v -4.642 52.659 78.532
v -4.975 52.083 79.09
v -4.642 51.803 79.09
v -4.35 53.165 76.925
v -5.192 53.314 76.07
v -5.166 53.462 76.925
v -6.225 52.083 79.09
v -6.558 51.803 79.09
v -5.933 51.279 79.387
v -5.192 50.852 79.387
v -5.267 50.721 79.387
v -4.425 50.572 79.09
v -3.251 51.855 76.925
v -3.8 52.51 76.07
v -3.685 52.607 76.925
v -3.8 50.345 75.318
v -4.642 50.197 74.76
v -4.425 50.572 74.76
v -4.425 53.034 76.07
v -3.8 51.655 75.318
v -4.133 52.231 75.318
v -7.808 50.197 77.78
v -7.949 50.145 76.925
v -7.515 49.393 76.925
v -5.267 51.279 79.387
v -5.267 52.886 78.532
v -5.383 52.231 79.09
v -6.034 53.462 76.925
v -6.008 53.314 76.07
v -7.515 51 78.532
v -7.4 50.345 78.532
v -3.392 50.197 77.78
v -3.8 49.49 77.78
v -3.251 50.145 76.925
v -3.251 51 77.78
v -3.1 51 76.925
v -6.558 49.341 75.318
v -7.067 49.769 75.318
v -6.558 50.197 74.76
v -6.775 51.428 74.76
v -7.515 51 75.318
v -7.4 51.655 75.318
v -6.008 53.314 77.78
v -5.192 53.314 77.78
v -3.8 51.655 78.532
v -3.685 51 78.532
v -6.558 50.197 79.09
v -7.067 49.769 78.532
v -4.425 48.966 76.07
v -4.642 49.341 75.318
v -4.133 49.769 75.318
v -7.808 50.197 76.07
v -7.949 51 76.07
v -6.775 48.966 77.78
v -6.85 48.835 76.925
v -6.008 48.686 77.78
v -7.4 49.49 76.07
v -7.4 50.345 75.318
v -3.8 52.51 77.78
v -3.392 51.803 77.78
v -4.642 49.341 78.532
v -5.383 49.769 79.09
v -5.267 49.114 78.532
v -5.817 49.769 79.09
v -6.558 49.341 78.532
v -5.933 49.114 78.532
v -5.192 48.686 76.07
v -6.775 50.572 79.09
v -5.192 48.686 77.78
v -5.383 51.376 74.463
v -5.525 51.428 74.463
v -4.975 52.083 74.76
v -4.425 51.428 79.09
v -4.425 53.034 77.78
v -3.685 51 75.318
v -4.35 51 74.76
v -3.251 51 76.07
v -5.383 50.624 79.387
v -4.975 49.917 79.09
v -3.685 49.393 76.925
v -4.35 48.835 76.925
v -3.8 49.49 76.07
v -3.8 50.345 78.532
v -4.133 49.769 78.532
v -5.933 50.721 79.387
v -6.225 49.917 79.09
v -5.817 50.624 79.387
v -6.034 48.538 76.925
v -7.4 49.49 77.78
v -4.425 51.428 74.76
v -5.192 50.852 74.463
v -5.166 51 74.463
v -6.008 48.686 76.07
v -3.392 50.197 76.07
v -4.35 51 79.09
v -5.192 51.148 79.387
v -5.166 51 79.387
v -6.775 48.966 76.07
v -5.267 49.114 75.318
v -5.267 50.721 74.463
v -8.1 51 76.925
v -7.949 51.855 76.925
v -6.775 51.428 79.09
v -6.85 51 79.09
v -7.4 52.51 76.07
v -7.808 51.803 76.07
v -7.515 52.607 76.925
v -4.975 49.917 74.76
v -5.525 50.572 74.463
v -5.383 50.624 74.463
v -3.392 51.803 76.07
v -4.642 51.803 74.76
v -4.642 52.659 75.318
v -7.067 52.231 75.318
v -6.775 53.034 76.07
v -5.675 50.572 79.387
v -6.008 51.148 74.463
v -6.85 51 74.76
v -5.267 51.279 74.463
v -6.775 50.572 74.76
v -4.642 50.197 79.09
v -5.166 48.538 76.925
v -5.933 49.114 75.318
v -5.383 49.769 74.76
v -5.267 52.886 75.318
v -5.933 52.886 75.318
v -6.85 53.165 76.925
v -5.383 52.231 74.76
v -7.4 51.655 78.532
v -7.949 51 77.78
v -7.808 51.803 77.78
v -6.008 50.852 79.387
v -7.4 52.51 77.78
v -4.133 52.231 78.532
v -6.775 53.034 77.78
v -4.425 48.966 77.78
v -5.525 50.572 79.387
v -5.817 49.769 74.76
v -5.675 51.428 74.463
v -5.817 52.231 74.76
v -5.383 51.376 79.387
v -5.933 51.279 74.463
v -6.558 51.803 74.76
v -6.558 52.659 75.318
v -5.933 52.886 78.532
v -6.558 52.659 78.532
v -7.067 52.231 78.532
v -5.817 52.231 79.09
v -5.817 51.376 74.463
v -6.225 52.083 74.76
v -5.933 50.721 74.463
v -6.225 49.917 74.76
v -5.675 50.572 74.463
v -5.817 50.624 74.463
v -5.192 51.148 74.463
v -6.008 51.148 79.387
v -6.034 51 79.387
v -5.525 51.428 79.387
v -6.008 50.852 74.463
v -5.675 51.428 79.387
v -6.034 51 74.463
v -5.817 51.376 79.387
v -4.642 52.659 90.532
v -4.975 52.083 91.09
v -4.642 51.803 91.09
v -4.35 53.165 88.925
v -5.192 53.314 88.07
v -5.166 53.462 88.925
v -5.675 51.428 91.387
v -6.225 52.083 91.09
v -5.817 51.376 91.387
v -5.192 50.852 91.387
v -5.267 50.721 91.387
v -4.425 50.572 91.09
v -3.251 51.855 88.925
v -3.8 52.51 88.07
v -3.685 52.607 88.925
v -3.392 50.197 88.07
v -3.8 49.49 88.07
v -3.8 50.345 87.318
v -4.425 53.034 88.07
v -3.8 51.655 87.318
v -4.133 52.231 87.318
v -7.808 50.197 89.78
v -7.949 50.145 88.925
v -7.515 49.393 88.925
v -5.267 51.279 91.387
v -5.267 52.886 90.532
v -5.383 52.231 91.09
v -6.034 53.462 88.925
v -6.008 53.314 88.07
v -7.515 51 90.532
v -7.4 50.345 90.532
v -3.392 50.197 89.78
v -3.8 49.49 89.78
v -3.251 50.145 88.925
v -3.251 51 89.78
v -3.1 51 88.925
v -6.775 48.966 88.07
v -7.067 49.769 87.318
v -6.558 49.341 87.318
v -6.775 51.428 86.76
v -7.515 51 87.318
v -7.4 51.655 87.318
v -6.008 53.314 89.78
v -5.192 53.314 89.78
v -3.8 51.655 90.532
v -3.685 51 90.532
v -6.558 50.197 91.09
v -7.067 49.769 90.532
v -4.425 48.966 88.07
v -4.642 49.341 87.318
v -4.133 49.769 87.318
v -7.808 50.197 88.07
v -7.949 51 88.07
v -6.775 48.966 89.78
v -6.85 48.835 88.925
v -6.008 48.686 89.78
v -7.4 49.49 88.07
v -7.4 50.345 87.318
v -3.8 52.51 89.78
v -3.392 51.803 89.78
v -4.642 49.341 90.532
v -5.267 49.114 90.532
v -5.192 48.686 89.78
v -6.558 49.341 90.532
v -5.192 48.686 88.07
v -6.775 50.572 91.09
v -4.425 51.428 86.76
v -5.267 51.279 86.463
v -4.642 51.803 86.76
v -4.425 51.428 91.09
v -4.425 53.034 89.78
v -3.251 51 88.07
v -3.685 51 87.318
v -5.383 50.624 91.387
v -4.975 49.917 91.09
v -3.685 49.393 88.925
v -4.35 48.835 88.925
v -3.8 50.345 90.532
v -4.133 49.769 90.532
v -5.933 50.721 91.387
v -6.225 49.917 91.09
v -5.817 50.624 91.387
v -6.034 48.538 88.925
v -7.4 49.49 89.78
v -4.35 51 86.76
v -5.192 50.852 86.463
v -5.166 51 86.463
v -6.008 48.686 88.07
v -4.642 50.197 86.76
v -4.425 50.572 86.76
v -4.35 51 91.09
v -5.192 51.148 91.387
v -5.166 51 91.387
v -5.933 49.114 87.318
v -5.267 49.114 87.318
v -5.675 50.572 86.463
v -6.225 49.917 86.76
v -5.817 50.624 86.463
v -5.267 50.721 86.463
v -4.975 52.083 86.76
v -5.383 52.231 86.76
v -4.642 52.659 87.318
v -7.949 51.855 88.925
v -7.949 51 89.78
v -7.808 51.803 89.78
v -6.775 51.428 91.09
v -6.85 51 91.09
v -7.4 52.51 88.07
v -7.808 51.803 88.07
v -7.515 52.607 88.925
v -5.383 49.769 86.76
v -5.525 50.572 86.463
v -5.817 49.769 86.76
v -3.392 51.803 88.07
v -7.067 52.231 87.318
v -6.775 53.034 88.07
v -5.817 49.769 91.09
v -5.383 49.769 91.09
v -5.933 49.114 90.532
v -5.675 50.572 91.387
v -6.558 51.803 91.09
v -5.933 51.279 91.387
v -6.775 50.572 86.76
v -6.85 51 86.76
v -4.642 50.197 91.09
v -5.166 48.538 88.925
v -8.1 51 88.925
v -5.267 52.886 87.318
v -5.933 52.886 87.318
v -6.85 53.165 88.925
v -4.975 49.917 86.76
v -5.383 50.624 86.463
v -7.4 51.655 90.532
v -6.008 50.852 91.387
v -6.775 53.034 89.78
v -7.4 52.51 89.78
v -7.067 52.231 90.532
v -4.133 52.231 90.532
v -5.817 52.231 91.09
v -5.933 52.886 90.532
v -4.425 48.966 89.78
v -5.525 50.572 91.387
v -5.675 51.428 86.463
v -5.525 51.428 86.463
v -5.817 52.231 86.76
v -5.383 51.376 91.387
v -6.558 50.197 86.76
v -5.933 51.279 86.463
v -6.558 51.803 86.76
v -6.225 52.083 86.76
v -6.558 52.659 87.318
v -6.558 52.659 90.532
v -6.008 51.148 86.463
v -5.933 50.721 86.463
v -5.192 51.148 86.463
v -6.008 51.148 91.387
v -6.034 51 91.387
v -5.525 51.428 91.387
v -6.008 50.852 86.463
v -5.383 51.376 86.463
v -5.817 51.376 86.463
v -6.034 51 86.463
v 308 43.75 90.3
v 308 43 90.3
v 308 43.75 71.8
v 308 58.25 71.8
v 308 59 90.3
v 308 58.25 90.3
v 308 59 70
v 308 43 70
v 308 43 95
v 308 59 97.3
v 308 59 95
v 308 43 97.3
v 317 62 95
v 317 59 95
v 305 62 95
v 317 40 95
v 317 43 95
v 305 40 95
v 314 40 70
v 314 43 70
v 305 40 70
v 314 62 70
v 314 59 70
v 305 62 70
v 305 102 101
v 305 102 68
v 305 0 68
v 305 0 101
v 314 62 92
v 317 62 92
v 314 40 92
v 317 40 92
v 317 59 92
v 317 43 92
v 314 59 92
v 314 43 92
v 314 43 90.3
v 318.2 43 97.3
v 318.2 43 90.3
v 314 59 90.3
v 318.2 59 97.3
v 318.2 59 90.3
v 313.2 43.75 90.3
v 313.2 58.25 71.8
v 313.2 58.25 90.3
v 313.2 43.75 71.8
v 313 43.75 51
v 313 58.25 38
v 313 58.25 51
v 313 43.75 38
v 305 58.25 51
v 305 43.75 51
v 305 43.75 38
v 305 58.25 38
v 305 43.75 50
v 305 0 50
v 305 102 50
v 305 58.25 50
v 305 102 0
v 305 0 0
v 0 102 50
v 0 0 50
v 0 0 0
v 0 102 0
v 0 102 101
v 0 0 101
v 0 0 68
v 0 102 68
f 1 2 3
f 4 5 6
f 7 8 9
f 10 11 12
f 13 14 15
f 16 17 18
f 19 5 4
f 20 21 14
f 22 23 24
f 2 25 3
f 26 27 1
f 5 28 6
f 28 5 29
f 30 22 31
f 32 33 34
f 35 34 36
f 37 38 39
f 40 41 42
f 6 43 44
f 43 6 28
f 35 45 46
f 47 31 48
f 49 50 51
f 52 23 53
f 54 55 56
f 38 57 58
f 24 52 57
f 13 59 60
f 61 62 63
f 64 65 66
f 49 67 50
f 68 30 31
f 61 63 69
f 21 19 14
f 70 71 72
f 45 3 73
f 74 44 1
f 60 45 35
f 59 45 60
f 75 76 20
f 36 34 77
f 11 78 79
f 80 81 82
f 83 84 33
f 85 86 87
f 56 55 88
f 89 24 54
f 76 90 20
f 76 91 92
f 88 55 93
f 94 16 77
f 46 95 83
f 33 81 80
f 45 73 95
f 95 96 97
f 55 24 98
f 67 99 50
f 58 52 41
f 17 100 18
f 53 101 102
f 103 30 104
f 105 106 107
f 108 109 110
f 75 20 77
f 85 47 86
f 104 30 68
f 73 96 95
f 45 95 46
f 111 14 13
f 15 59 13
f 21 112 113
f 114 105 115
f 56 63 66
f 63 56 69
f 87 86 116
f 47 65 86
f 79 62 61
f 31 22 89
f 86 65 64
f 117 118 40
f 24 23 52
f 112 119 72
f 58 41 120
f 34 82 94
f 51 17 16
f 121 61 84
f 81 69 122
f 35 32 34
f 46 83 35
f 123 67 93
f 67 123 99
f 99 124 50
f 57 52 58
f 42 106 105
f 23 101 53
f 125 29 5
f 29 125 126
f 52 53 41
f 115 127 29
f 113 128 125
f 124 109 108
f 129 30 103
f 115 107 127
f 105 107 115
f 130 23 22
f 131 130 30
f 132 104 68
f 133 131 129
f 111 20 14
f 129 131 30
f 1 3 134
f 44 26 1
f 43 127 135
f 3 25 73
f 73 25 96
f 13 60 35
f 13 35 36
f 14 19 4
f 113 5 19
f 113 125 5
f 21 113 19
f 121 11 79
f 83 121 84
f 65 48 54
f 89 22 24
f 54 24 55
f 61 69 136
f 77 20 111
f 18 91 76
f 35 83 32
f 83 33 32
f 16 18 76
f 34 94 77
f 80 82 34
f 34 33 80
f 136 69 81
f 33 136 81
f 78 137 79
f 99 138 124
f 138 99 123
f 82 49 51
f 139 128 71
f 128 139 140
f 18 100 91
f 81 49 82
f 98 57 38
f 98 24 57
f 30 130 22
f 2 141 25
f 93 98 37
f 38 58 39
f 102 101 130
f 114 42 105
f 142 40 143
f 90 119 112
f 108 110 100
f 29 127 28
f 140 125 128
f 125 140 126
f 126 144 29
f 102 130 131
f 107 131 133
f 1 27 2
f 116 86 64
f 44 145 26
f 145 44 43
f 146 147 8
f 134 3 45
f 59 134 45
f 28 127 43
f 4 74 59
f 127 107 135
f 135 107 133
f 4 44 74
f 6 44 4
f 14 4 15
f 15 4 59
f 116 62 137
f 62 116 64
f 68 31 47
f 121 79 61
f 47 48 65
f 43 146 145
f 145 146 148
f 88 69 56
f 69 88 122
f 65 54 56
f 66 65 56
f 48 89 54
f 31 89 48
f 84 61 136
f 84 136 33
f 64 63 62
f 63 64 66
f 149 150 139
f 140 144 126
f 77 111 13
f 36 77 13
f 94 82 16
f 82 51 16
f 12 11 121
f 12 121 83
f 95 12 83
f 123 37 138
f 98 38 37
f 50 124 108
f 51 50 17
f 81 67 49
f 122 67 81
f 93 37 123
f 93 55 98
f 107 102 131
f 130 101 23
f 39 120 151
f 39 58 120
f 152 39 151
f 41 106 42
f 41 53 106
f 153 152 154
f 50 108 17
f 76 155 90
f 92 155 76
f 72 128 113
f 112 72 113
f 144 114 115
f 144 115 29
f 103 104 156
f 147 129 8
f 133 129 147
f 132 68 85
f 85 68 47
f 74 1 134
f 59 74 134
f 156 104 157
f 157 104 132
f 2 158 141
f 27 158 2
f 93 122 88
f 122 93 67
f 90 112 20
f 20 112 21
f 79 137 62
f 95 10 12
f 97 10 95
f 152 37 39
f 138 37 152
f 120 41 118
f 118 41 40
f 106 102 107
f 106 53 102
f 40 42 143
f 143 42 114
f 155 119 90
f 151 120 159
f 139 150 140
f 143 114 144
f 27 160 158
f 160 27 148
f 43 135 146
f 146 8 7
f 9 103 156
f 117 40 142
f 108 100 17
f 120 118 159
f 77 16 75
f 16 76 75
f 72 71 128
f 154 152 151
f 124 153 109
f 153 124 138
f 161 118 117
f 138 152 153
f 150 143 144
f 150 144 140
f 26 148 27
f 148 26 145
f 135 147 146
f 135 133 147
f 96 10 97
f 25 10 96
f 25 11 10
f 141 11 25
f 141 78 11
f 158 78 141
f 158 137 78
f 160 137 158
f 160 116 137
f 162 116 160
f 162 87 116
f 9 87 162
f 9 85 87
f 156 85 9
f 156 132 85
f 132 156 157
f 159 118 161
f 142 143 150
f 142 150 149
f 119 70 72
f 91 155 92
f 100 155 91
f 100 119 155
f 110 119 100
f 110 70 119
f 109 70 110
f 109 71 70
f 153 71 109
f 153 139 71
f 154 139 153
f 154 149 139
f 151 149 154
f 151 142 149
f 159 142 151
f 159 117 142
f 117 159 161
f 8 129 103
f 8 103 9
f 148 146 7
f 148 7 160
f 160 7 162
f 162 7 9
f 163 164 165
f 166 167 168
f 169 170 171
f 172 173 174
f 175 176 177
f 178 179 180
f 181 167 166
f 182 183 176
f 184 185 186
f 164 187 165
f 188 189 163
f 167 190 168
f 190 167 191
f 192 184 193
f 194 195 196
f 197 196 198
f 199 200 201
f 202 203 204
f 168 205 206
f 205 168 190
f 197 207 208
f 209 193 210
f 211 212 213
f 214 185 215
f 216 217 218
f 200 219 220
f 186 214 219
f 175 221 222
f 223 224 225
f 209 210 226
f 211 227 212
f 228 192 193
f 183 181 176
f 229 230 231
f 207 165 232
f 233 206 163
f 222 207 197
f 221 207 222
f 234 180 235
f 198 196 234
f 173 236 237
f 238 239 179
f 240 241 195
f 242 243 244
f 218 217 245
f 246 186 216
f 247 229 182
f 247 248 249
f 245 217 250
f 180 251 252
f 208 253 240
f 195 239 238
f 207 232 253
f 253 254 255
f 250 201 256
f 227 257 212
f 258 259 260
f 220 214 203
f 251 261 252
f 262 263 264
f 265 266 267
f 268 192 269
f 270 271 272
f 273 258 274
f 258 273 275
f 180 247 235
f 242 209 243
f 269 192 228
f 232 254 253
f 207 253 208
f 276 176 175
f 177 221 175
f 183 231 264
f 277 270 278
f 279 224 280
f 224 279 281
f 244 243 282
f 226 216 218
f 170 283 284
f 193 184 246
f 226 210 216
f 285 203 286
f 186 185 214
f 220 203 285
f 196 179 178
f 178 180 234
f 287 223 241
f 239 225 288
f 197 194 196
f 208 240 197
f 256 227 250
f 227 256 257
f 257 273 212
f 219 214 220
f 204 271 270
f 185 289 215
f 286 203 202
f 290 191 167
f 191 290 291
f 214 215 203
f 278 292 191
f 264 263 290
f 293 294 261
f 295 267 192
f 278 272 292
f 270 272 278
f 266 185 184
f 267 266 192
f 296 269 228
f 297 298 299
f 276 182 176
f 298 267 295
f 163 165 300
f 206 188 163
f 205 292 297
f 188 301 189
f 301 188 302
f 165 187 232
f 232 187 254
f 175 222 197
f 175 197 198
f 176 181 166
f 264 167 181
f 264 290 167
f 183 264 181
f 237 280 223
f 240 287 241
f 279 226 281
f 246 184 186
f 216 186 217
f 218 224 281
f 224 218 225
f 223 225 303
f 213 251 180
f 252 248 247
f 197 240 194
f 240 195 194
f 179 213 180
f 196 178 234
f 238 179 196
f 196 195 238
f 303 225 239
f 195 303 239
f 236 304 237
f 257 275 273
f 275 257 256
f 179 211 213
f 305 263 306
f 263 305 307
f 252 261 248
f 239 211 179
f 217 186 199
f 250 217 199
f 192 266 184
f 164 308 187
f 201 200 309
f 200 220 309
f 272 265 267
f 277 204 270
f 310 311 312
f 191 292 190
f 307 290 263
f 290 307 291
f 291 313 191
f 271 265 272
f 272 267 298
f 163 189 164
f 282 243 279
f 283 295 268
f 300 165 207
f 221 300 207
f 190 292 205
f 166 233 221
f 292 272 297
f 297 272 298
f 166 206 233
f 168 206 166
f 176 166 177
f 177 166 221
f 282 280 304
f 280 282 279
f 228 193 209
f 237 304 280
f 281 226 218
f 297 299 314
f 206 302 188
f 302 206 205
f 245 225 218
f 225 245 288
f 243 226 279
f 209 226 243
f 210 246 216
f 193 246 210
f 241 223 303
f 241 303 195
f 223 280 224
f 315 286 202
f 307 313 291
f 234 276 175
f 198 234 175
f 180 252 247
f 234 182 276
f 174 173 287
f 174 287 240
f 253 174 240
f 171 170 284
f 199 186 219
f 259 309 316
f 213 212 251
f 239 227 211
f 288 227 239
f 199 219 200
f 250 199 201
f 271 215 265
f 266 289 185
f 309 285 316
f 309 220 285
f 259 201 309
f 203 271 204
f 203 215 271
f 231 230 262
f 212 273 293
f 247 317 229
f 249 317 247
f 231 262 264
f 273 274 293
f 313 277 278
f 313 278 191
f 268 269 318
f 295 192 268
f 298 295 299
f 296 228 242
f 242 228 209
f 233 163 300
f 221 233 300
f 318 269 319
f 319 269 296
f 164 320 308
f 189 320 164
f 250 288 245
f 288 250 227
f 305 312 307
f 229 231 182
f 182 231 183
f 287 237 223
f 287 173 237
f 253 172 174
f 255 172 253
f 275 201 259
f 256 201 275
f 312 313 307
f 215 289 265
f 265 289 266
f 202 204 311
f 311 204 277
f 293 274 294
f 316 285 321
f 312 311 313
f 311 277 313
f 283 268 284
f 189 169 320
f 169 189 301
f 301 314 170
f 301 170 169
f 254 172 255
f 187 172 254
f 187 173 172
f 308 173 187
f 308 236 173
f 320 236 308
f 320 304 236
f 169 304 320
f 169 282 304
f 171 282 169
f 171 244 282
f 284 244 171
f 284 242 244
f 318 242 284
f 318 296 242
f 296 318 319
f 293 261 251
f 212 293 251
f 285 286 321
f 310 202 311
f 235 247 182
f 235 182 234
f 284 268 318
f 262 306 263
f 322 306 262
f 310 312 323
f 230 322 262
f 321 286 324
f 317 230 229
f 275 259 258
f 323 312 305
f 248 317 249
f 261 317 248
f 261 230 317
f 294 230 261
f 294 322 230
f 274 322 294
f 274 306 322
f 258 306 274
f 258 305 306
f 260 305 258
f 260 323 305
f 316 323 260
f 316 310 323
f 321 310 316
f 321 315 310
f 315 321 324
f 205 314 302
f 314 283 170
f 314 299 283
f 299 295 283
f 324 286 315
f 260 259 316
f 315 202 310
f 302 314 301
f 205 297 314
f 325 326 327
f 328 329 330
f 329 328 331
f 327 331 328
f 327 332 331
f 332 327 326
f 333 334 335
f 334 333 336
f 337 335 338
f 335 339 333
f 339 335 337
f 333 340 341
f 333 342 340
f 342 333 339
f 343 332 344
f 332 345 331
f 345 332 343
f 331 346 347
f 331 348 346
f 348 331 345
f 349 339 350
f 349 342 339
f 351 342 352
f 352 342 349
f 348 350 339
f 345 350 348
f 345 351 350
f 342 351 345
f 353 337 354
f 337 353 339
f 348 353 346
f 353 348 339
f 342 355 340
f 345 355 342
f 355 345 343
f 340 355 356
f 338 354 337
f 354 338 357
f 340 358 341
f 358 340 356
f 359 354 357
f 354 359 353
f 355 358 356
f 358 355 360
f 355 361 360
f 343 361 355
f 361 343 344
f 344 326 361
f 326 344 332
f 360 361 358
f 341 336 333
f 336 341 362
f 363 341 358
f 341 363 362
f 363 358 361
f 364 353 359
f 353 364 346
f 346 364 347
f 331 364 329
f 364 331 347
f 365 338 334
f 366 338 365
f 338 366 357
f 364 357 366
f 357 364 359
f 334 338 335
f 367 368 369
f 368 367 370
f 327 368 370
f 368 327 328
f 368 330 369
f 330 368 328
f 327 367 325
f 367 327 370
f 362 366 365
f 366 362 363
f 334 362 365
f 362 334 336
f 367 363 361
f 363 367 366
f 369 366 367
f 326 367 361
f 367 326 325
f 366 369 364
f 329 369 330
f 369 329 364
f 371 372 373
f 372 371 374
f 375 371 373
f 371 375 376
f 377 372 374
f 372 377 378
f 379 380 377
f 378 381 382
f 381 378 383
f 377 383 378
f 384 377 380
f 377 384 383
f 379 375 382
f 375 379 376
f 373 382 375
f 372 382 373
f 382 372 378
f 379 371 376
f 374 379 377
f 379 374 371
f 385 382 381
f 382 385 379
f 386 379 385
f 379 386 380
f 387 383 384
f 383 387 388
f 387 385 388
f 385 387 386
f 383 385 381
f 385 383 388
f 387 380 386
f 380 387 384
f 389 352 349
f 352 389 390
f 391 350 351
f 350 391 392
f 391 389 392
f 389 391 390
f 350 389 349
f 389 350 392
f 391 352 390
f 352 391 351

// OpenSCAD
// 03_sliding_bolt_detent.scad
// Sliding bolt with snap-ball detent on the SHORT end-wall of the upper tray.
// A rectangular bolt rides in a channel on the end face; sliding it down/in
// causes the tip to enter a pocket in the lower tray end-wall, locking both
// lift and pull-apart. A snap-ball detent clicks in OPEN and LOCKED positions.
// Engage: push bolt downward (−Z) until it clicks into the lower pocket.
// Release: pull bolt upward (+Z) until it clicks out, then lift upper tray.
//
// Two bolts (one per short end face) for positive grip at both ends.

explode = 18; // 0=engaged, 18=exploded

lx = 305; ly = 102; lz_lo = 50; lz_hi = 33;
wall = 3;

color_lo  = [0.35, 0.55, 0.80, 1];
color_hi  = [0.55, 0.78, 0.95, 1];
color_bolt= [0.85, 0.58, 0.10, 1];   // amber bolt
color_ch  = [0.22, 0.40, 0.65, 1];   // dark-blue channel housing
color_pkt = [0.50, 0.30, 0.70, 1];   // purple pocket indicator

module lower_tray() { color(color_lo) cube([lx, ly, lz_lo]); }
module upper_tray() {
    color(color_hi) translate([0, 0, lz_lo + explode]) cube([lx, ly, lz_hi]);
}

// ── Parameters ────────────────────────────────────────────────────────────────
ch_w   = 16;    // channel interior width (Y)
ch_h   = 22;    // channel interior height (Z span on end face)
ch_t   = 3;     // channel housing wall thickness
prot   = 6;     // channel protrudes this much out from end-face (X)

bolt_w = ch_w - 1.5;
bolt_h = ch_h - 1.5;
bolt_t = prot - 0.8;
tip_d  = 12;    // how far bolt plunges into lower pocket when locked

// Travel: bolt slides -Z to engage
locked = (explode == 0);
bolt_dz = locked ? -tip_d : 0;   // bolt position shift

by = ly / 2;  // centre of short face

// ── Channel housing on upper tray end face ───────────────────────────────────
module channel_box(ex) {
    x_dir = (ex == 0) ? -1 : 1;
    uz = lz_lo + explode;
    // Channel sits centred on Y, from just above mating face upward
    color(color_ch) {
        // back plate (against tray face)
        translate([ex, by - ch_w/2 - ch_t, uz + 2])
            cube([x_dir * ch_t, ch_w + ch_t * 2, ch_h + ch_t]);
        // top cap
        translate([ex, by - ch_w/2 - ch_t, uz + 2 + ch_h])
            cube([x_dir * (ch_t + prot + ch_t), ch_w + ch_t * 2, ch_t]);
        // left side wall
        translate([ex, by - ch_w/2 - ch_t, uz + 2])
            cube([x_dir * (prot + ch_t), ch_t, ch_h + ch_t]);
        // right side wall
        translate([ex, by + ch_w/2, uz + 2])
            cube([x_dir * (prot + ch_t), ch_t, ch_h + ch_t]);
    }
}

// ── Receiving pocket on lower tray end face ───────────────────────────────────
module lower_pocket(ex) {
    x_dir = (ex == 0) ? -1 : 1;
    // Pocket straddles mating face: dips below lz_lo
    color(color_pkt)
    translate([ex, by - bolt_w/2, lz_lo - tip_d])
        cube([x_dir * (prot + ch_t - 1), bolt_w, tip_d + 1]);
}

// ── Bolt body ─────────────────────────────────────────────────────────────────
module bolt(ex) {
    x_dir = (ex == 0) ? -1 : 1;
    uz = lz_lo + explode;
    bz = uz + 2 + ch_t * 0.6 + bolt_dz;

    color(color_bolt) {
        // Main bolt slab
        translate([ex + x_dir * ch_t, by - bolt_w/2, bz])
            cube([x_dir * bolt_t, bolt_w, bolt_h]);
        // Thumb pull tab at top
        translate([ex + x_dir * ch_t, by - 8, bz + bolt_h - 2])
            cube([x_dir * (bolt_t + 5), 16, 7]);
    }

    // Detent balls (two positions: open and locked)
    for (dz = [bolt_h * 0.25, bolt_h * 0.25 + tip_d])
    color([0.95, 0.95, 0.25])
    translate([ex + x_dir * (ch_t + bolt_t/2), by, bz + dz])
        sphere(r = 2.5, $fn=18);
}

// ── Assembly ──────────────────────────────────────────────────────────────────
lower_tray();
upper_tray();
for (ex = [0, lx]) {
    channel_box(ex);
    lower_pocket(ex);
    bolt(ex);
}
